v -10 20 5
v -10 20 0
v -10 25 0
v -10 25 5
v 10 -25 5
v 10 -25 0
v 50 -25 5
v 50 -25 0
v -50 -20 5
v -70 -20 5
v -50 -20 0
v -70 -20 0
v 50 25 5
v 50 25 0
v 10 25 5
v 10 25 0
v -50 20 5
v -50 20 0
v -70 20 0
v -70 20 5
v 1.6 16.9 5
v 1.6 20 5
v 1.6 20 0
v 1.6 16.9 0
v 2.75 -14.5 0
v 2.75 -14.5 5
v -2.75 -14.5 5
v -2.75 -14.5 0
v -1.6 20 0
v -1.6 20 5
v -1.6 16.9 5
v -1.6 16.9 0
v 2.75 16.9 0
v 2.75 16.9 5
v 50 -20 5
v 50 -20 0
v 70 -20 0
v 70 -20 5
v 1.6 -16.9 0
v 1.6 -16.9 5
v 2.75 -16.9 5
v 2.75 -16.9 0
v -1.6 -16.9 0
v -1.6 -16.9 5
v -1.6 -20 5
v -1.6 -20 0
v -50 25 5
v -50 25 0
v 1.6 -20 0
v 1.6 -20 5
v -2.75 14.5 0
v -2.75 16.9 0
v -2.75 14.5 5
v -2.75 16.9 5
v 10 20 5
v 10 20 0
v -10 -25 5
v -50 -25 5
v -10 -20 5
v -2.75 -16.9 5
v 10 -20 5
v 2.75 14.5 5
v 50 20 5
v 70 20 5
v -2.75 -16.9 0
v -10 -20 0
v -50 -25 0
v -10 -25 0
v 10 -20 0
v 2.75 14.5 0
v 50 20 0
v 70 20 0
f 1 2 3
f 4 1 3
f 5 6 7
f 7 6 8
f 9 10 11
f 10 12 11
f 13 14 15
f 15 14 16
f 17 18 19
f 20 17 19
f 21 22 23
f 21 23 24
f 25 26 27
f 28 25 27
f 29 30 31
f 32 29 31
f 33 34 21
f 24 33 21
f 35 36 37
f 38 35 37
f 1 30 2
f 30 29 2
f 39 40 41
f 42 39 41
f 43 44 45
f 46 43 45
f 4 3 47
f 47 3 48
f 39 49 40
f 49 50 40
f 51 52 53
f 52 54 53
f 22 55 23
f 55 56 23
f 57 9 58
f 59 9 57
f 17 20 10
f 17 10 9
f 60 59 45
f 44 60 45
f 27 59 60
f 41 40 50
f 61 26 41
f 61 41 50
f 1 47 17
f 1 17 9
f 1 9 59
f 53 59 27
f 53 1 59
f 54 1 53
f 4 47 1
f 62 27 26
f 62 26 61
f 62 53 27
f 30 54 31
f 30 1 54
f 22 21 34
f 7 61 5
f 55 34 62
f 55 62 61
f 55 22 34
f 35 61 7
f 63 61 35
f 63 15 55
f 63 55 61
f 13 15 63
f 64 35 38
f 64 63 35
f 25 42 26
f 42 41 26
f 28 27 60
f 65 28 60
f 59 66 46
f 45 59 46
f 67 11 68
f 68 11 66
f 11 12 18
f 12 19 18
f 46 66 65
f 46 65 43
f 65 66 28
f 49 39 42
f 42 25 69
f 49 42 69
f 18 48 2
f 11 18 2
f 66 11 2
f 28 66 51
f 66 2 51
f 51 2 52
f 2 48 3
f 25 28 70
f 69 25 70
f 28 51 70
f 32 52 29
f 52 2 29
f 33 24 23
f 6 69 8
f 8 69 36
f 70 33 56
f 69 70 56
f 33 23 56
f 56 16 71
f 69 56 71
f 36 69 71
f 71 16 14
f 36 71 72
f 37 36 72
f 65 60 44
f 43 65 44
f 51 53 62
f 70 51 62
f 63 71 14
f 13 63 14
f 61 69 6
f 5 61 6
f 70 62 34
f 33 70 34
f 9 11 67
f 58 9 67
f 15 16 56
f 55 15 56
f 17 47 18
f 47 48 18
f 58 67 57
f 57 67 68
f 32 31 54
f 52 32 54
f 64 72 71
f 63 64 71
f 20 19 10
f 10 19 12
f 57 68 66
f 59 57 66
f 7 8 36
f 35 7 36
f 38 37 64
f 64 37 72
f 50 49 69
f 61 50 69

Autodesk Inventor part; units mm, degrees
ref_plane "YZ Plane" through (0, 0, 0) normal (1, 0, 0) x (0, 1, 0)
ref_plane "XZ Plane" through (0, 0, 0) normal (0, 1, 0) x (-1, 0, 0)
ref_plane "XY Plane" through (0, 0, 0) normal (0, 0, 1) x (1, 0, 0)
sketch "Sketch2" plane through (0, 0, 0) normal (0, 0, 1) x (1, 0, 0)
  line L0 (-70, 20) -> (-70, -20)
  line L1 (-70, -20) -> (-50, -20)
  line L2 (-50, -20) -> (-50, -25)
  line L3 (-50, -25) -> (-10, -25)
  line L4 (-10, -25) -> (-10, -20)
  line L5 (-10, -20) -> (10, -20)
  line L6 (10, -20) -> (10, -25)
  line L7 (10, -25) -> (50, -25)
  line L8 (50, -25) -> (50, -20)
  line L9 (50, -20) -> (70, -20)
  line L10 (70, -20) -> (70, 20)
  line L11 (70, 20) -> (50, 20)
  line L12 (50, 20) -> (50, 25)
  line L13 (50, 25) -> (10, 25)
  line L14 (10, 25) -> (10, 20)
  line L15 (10, 20) -> (-10, 20)
  line L16 (-10, 20) -> (-10, 25)
  line L17 (-10, 25) -> (-50, 25)
  line L18 (-50, 25) -> (-50, 20)
  line L19 (-50, 20) -> (-70, 20)
  point P0 (0, 0)
  point P1 (0, 20)
  point P2 (0, -20)
  point P3 (-70, 0)
  point P4 (70, 0)
  dimension "d11" = 5
  dimension "d12" = 40
  dimension "d13" = 20
  dimension "d14" = 40
  dimension "d15" = 140
  dimension "d16" = 40
  dimension "d17" = 5
  dimension "d18" = 70
extrude "Extrusion1" add sketch "Sketch2" along normal blind 5
sketch "Sketch3" plane through (0, 0, 5) normal (0, 0, 1) x (1, 0, 0)
  line L0 (10, 20) -> (-10, 20) projected
  line L1 (-10, -20) -> (10, -20) projected
  line L2 (1.6, 20) -> (-1.6, 20)
  line L3 (-1.6, 20) -> (-1.6, 16.9)
  line L4 (-1.6, 16.9) -> (-2.75, 16.9)
  line L5 (-2.75, 16.9) -> (-2.75, 14.5)
  line L6 (-2.75, 14.5) -> (2.75, 14.5)
  line L7 (2.75, 14.5) -> (2.75, 16.9)
  line L8 (2.75, 16.9) -> (1.6, 16.9)
  line L9 (1.6, 20) -> (1.6, 16.9)
  line L10 (-1.6, -20) -> (1.6, -20)
  line L11 (1.6, -20) -> (1.6, -16.9)
  line L12 (1.6, -16.9) -> (2.75, -16.9)
  line L13 (2.75, -16.9) -> (2.75, -14.5)
  line L14 (2.75, -14.5) -> (-2.75, -14.5)
  line L15 (-2.75, -14.5) -> (-2.75, -16.9)
  line L16 (-2.75, -16.9) -> (-1.6, -16.9)
  line L17 (-1.6, -16.9) -> (-1.6, -20)
  point P0 (0, 0)
  point P1 (0, 20)
  point P2 (0, 14.5)
  point P3 (0, -20)
  point P4 (0, -14.5)
  point P5 (0, 20)
  dimension "d21" = 3.2
  dimension "d22" = 2.4
  dimension "d23" = 2.4
  dimension "d24" = 3.2
  dimension "d25" = 5.5
  dimension "d26" = 5.5
  dimension "d27" = 5.5
  dimension "d28" = 5.5
extrude "Extrusion2" cut sketch "Sketch3" against normal blind 5
equation "\"d18\" = 0.5 * d15"
properties part number "Interrupter_Side" material "Polycarbonate, Clear"
